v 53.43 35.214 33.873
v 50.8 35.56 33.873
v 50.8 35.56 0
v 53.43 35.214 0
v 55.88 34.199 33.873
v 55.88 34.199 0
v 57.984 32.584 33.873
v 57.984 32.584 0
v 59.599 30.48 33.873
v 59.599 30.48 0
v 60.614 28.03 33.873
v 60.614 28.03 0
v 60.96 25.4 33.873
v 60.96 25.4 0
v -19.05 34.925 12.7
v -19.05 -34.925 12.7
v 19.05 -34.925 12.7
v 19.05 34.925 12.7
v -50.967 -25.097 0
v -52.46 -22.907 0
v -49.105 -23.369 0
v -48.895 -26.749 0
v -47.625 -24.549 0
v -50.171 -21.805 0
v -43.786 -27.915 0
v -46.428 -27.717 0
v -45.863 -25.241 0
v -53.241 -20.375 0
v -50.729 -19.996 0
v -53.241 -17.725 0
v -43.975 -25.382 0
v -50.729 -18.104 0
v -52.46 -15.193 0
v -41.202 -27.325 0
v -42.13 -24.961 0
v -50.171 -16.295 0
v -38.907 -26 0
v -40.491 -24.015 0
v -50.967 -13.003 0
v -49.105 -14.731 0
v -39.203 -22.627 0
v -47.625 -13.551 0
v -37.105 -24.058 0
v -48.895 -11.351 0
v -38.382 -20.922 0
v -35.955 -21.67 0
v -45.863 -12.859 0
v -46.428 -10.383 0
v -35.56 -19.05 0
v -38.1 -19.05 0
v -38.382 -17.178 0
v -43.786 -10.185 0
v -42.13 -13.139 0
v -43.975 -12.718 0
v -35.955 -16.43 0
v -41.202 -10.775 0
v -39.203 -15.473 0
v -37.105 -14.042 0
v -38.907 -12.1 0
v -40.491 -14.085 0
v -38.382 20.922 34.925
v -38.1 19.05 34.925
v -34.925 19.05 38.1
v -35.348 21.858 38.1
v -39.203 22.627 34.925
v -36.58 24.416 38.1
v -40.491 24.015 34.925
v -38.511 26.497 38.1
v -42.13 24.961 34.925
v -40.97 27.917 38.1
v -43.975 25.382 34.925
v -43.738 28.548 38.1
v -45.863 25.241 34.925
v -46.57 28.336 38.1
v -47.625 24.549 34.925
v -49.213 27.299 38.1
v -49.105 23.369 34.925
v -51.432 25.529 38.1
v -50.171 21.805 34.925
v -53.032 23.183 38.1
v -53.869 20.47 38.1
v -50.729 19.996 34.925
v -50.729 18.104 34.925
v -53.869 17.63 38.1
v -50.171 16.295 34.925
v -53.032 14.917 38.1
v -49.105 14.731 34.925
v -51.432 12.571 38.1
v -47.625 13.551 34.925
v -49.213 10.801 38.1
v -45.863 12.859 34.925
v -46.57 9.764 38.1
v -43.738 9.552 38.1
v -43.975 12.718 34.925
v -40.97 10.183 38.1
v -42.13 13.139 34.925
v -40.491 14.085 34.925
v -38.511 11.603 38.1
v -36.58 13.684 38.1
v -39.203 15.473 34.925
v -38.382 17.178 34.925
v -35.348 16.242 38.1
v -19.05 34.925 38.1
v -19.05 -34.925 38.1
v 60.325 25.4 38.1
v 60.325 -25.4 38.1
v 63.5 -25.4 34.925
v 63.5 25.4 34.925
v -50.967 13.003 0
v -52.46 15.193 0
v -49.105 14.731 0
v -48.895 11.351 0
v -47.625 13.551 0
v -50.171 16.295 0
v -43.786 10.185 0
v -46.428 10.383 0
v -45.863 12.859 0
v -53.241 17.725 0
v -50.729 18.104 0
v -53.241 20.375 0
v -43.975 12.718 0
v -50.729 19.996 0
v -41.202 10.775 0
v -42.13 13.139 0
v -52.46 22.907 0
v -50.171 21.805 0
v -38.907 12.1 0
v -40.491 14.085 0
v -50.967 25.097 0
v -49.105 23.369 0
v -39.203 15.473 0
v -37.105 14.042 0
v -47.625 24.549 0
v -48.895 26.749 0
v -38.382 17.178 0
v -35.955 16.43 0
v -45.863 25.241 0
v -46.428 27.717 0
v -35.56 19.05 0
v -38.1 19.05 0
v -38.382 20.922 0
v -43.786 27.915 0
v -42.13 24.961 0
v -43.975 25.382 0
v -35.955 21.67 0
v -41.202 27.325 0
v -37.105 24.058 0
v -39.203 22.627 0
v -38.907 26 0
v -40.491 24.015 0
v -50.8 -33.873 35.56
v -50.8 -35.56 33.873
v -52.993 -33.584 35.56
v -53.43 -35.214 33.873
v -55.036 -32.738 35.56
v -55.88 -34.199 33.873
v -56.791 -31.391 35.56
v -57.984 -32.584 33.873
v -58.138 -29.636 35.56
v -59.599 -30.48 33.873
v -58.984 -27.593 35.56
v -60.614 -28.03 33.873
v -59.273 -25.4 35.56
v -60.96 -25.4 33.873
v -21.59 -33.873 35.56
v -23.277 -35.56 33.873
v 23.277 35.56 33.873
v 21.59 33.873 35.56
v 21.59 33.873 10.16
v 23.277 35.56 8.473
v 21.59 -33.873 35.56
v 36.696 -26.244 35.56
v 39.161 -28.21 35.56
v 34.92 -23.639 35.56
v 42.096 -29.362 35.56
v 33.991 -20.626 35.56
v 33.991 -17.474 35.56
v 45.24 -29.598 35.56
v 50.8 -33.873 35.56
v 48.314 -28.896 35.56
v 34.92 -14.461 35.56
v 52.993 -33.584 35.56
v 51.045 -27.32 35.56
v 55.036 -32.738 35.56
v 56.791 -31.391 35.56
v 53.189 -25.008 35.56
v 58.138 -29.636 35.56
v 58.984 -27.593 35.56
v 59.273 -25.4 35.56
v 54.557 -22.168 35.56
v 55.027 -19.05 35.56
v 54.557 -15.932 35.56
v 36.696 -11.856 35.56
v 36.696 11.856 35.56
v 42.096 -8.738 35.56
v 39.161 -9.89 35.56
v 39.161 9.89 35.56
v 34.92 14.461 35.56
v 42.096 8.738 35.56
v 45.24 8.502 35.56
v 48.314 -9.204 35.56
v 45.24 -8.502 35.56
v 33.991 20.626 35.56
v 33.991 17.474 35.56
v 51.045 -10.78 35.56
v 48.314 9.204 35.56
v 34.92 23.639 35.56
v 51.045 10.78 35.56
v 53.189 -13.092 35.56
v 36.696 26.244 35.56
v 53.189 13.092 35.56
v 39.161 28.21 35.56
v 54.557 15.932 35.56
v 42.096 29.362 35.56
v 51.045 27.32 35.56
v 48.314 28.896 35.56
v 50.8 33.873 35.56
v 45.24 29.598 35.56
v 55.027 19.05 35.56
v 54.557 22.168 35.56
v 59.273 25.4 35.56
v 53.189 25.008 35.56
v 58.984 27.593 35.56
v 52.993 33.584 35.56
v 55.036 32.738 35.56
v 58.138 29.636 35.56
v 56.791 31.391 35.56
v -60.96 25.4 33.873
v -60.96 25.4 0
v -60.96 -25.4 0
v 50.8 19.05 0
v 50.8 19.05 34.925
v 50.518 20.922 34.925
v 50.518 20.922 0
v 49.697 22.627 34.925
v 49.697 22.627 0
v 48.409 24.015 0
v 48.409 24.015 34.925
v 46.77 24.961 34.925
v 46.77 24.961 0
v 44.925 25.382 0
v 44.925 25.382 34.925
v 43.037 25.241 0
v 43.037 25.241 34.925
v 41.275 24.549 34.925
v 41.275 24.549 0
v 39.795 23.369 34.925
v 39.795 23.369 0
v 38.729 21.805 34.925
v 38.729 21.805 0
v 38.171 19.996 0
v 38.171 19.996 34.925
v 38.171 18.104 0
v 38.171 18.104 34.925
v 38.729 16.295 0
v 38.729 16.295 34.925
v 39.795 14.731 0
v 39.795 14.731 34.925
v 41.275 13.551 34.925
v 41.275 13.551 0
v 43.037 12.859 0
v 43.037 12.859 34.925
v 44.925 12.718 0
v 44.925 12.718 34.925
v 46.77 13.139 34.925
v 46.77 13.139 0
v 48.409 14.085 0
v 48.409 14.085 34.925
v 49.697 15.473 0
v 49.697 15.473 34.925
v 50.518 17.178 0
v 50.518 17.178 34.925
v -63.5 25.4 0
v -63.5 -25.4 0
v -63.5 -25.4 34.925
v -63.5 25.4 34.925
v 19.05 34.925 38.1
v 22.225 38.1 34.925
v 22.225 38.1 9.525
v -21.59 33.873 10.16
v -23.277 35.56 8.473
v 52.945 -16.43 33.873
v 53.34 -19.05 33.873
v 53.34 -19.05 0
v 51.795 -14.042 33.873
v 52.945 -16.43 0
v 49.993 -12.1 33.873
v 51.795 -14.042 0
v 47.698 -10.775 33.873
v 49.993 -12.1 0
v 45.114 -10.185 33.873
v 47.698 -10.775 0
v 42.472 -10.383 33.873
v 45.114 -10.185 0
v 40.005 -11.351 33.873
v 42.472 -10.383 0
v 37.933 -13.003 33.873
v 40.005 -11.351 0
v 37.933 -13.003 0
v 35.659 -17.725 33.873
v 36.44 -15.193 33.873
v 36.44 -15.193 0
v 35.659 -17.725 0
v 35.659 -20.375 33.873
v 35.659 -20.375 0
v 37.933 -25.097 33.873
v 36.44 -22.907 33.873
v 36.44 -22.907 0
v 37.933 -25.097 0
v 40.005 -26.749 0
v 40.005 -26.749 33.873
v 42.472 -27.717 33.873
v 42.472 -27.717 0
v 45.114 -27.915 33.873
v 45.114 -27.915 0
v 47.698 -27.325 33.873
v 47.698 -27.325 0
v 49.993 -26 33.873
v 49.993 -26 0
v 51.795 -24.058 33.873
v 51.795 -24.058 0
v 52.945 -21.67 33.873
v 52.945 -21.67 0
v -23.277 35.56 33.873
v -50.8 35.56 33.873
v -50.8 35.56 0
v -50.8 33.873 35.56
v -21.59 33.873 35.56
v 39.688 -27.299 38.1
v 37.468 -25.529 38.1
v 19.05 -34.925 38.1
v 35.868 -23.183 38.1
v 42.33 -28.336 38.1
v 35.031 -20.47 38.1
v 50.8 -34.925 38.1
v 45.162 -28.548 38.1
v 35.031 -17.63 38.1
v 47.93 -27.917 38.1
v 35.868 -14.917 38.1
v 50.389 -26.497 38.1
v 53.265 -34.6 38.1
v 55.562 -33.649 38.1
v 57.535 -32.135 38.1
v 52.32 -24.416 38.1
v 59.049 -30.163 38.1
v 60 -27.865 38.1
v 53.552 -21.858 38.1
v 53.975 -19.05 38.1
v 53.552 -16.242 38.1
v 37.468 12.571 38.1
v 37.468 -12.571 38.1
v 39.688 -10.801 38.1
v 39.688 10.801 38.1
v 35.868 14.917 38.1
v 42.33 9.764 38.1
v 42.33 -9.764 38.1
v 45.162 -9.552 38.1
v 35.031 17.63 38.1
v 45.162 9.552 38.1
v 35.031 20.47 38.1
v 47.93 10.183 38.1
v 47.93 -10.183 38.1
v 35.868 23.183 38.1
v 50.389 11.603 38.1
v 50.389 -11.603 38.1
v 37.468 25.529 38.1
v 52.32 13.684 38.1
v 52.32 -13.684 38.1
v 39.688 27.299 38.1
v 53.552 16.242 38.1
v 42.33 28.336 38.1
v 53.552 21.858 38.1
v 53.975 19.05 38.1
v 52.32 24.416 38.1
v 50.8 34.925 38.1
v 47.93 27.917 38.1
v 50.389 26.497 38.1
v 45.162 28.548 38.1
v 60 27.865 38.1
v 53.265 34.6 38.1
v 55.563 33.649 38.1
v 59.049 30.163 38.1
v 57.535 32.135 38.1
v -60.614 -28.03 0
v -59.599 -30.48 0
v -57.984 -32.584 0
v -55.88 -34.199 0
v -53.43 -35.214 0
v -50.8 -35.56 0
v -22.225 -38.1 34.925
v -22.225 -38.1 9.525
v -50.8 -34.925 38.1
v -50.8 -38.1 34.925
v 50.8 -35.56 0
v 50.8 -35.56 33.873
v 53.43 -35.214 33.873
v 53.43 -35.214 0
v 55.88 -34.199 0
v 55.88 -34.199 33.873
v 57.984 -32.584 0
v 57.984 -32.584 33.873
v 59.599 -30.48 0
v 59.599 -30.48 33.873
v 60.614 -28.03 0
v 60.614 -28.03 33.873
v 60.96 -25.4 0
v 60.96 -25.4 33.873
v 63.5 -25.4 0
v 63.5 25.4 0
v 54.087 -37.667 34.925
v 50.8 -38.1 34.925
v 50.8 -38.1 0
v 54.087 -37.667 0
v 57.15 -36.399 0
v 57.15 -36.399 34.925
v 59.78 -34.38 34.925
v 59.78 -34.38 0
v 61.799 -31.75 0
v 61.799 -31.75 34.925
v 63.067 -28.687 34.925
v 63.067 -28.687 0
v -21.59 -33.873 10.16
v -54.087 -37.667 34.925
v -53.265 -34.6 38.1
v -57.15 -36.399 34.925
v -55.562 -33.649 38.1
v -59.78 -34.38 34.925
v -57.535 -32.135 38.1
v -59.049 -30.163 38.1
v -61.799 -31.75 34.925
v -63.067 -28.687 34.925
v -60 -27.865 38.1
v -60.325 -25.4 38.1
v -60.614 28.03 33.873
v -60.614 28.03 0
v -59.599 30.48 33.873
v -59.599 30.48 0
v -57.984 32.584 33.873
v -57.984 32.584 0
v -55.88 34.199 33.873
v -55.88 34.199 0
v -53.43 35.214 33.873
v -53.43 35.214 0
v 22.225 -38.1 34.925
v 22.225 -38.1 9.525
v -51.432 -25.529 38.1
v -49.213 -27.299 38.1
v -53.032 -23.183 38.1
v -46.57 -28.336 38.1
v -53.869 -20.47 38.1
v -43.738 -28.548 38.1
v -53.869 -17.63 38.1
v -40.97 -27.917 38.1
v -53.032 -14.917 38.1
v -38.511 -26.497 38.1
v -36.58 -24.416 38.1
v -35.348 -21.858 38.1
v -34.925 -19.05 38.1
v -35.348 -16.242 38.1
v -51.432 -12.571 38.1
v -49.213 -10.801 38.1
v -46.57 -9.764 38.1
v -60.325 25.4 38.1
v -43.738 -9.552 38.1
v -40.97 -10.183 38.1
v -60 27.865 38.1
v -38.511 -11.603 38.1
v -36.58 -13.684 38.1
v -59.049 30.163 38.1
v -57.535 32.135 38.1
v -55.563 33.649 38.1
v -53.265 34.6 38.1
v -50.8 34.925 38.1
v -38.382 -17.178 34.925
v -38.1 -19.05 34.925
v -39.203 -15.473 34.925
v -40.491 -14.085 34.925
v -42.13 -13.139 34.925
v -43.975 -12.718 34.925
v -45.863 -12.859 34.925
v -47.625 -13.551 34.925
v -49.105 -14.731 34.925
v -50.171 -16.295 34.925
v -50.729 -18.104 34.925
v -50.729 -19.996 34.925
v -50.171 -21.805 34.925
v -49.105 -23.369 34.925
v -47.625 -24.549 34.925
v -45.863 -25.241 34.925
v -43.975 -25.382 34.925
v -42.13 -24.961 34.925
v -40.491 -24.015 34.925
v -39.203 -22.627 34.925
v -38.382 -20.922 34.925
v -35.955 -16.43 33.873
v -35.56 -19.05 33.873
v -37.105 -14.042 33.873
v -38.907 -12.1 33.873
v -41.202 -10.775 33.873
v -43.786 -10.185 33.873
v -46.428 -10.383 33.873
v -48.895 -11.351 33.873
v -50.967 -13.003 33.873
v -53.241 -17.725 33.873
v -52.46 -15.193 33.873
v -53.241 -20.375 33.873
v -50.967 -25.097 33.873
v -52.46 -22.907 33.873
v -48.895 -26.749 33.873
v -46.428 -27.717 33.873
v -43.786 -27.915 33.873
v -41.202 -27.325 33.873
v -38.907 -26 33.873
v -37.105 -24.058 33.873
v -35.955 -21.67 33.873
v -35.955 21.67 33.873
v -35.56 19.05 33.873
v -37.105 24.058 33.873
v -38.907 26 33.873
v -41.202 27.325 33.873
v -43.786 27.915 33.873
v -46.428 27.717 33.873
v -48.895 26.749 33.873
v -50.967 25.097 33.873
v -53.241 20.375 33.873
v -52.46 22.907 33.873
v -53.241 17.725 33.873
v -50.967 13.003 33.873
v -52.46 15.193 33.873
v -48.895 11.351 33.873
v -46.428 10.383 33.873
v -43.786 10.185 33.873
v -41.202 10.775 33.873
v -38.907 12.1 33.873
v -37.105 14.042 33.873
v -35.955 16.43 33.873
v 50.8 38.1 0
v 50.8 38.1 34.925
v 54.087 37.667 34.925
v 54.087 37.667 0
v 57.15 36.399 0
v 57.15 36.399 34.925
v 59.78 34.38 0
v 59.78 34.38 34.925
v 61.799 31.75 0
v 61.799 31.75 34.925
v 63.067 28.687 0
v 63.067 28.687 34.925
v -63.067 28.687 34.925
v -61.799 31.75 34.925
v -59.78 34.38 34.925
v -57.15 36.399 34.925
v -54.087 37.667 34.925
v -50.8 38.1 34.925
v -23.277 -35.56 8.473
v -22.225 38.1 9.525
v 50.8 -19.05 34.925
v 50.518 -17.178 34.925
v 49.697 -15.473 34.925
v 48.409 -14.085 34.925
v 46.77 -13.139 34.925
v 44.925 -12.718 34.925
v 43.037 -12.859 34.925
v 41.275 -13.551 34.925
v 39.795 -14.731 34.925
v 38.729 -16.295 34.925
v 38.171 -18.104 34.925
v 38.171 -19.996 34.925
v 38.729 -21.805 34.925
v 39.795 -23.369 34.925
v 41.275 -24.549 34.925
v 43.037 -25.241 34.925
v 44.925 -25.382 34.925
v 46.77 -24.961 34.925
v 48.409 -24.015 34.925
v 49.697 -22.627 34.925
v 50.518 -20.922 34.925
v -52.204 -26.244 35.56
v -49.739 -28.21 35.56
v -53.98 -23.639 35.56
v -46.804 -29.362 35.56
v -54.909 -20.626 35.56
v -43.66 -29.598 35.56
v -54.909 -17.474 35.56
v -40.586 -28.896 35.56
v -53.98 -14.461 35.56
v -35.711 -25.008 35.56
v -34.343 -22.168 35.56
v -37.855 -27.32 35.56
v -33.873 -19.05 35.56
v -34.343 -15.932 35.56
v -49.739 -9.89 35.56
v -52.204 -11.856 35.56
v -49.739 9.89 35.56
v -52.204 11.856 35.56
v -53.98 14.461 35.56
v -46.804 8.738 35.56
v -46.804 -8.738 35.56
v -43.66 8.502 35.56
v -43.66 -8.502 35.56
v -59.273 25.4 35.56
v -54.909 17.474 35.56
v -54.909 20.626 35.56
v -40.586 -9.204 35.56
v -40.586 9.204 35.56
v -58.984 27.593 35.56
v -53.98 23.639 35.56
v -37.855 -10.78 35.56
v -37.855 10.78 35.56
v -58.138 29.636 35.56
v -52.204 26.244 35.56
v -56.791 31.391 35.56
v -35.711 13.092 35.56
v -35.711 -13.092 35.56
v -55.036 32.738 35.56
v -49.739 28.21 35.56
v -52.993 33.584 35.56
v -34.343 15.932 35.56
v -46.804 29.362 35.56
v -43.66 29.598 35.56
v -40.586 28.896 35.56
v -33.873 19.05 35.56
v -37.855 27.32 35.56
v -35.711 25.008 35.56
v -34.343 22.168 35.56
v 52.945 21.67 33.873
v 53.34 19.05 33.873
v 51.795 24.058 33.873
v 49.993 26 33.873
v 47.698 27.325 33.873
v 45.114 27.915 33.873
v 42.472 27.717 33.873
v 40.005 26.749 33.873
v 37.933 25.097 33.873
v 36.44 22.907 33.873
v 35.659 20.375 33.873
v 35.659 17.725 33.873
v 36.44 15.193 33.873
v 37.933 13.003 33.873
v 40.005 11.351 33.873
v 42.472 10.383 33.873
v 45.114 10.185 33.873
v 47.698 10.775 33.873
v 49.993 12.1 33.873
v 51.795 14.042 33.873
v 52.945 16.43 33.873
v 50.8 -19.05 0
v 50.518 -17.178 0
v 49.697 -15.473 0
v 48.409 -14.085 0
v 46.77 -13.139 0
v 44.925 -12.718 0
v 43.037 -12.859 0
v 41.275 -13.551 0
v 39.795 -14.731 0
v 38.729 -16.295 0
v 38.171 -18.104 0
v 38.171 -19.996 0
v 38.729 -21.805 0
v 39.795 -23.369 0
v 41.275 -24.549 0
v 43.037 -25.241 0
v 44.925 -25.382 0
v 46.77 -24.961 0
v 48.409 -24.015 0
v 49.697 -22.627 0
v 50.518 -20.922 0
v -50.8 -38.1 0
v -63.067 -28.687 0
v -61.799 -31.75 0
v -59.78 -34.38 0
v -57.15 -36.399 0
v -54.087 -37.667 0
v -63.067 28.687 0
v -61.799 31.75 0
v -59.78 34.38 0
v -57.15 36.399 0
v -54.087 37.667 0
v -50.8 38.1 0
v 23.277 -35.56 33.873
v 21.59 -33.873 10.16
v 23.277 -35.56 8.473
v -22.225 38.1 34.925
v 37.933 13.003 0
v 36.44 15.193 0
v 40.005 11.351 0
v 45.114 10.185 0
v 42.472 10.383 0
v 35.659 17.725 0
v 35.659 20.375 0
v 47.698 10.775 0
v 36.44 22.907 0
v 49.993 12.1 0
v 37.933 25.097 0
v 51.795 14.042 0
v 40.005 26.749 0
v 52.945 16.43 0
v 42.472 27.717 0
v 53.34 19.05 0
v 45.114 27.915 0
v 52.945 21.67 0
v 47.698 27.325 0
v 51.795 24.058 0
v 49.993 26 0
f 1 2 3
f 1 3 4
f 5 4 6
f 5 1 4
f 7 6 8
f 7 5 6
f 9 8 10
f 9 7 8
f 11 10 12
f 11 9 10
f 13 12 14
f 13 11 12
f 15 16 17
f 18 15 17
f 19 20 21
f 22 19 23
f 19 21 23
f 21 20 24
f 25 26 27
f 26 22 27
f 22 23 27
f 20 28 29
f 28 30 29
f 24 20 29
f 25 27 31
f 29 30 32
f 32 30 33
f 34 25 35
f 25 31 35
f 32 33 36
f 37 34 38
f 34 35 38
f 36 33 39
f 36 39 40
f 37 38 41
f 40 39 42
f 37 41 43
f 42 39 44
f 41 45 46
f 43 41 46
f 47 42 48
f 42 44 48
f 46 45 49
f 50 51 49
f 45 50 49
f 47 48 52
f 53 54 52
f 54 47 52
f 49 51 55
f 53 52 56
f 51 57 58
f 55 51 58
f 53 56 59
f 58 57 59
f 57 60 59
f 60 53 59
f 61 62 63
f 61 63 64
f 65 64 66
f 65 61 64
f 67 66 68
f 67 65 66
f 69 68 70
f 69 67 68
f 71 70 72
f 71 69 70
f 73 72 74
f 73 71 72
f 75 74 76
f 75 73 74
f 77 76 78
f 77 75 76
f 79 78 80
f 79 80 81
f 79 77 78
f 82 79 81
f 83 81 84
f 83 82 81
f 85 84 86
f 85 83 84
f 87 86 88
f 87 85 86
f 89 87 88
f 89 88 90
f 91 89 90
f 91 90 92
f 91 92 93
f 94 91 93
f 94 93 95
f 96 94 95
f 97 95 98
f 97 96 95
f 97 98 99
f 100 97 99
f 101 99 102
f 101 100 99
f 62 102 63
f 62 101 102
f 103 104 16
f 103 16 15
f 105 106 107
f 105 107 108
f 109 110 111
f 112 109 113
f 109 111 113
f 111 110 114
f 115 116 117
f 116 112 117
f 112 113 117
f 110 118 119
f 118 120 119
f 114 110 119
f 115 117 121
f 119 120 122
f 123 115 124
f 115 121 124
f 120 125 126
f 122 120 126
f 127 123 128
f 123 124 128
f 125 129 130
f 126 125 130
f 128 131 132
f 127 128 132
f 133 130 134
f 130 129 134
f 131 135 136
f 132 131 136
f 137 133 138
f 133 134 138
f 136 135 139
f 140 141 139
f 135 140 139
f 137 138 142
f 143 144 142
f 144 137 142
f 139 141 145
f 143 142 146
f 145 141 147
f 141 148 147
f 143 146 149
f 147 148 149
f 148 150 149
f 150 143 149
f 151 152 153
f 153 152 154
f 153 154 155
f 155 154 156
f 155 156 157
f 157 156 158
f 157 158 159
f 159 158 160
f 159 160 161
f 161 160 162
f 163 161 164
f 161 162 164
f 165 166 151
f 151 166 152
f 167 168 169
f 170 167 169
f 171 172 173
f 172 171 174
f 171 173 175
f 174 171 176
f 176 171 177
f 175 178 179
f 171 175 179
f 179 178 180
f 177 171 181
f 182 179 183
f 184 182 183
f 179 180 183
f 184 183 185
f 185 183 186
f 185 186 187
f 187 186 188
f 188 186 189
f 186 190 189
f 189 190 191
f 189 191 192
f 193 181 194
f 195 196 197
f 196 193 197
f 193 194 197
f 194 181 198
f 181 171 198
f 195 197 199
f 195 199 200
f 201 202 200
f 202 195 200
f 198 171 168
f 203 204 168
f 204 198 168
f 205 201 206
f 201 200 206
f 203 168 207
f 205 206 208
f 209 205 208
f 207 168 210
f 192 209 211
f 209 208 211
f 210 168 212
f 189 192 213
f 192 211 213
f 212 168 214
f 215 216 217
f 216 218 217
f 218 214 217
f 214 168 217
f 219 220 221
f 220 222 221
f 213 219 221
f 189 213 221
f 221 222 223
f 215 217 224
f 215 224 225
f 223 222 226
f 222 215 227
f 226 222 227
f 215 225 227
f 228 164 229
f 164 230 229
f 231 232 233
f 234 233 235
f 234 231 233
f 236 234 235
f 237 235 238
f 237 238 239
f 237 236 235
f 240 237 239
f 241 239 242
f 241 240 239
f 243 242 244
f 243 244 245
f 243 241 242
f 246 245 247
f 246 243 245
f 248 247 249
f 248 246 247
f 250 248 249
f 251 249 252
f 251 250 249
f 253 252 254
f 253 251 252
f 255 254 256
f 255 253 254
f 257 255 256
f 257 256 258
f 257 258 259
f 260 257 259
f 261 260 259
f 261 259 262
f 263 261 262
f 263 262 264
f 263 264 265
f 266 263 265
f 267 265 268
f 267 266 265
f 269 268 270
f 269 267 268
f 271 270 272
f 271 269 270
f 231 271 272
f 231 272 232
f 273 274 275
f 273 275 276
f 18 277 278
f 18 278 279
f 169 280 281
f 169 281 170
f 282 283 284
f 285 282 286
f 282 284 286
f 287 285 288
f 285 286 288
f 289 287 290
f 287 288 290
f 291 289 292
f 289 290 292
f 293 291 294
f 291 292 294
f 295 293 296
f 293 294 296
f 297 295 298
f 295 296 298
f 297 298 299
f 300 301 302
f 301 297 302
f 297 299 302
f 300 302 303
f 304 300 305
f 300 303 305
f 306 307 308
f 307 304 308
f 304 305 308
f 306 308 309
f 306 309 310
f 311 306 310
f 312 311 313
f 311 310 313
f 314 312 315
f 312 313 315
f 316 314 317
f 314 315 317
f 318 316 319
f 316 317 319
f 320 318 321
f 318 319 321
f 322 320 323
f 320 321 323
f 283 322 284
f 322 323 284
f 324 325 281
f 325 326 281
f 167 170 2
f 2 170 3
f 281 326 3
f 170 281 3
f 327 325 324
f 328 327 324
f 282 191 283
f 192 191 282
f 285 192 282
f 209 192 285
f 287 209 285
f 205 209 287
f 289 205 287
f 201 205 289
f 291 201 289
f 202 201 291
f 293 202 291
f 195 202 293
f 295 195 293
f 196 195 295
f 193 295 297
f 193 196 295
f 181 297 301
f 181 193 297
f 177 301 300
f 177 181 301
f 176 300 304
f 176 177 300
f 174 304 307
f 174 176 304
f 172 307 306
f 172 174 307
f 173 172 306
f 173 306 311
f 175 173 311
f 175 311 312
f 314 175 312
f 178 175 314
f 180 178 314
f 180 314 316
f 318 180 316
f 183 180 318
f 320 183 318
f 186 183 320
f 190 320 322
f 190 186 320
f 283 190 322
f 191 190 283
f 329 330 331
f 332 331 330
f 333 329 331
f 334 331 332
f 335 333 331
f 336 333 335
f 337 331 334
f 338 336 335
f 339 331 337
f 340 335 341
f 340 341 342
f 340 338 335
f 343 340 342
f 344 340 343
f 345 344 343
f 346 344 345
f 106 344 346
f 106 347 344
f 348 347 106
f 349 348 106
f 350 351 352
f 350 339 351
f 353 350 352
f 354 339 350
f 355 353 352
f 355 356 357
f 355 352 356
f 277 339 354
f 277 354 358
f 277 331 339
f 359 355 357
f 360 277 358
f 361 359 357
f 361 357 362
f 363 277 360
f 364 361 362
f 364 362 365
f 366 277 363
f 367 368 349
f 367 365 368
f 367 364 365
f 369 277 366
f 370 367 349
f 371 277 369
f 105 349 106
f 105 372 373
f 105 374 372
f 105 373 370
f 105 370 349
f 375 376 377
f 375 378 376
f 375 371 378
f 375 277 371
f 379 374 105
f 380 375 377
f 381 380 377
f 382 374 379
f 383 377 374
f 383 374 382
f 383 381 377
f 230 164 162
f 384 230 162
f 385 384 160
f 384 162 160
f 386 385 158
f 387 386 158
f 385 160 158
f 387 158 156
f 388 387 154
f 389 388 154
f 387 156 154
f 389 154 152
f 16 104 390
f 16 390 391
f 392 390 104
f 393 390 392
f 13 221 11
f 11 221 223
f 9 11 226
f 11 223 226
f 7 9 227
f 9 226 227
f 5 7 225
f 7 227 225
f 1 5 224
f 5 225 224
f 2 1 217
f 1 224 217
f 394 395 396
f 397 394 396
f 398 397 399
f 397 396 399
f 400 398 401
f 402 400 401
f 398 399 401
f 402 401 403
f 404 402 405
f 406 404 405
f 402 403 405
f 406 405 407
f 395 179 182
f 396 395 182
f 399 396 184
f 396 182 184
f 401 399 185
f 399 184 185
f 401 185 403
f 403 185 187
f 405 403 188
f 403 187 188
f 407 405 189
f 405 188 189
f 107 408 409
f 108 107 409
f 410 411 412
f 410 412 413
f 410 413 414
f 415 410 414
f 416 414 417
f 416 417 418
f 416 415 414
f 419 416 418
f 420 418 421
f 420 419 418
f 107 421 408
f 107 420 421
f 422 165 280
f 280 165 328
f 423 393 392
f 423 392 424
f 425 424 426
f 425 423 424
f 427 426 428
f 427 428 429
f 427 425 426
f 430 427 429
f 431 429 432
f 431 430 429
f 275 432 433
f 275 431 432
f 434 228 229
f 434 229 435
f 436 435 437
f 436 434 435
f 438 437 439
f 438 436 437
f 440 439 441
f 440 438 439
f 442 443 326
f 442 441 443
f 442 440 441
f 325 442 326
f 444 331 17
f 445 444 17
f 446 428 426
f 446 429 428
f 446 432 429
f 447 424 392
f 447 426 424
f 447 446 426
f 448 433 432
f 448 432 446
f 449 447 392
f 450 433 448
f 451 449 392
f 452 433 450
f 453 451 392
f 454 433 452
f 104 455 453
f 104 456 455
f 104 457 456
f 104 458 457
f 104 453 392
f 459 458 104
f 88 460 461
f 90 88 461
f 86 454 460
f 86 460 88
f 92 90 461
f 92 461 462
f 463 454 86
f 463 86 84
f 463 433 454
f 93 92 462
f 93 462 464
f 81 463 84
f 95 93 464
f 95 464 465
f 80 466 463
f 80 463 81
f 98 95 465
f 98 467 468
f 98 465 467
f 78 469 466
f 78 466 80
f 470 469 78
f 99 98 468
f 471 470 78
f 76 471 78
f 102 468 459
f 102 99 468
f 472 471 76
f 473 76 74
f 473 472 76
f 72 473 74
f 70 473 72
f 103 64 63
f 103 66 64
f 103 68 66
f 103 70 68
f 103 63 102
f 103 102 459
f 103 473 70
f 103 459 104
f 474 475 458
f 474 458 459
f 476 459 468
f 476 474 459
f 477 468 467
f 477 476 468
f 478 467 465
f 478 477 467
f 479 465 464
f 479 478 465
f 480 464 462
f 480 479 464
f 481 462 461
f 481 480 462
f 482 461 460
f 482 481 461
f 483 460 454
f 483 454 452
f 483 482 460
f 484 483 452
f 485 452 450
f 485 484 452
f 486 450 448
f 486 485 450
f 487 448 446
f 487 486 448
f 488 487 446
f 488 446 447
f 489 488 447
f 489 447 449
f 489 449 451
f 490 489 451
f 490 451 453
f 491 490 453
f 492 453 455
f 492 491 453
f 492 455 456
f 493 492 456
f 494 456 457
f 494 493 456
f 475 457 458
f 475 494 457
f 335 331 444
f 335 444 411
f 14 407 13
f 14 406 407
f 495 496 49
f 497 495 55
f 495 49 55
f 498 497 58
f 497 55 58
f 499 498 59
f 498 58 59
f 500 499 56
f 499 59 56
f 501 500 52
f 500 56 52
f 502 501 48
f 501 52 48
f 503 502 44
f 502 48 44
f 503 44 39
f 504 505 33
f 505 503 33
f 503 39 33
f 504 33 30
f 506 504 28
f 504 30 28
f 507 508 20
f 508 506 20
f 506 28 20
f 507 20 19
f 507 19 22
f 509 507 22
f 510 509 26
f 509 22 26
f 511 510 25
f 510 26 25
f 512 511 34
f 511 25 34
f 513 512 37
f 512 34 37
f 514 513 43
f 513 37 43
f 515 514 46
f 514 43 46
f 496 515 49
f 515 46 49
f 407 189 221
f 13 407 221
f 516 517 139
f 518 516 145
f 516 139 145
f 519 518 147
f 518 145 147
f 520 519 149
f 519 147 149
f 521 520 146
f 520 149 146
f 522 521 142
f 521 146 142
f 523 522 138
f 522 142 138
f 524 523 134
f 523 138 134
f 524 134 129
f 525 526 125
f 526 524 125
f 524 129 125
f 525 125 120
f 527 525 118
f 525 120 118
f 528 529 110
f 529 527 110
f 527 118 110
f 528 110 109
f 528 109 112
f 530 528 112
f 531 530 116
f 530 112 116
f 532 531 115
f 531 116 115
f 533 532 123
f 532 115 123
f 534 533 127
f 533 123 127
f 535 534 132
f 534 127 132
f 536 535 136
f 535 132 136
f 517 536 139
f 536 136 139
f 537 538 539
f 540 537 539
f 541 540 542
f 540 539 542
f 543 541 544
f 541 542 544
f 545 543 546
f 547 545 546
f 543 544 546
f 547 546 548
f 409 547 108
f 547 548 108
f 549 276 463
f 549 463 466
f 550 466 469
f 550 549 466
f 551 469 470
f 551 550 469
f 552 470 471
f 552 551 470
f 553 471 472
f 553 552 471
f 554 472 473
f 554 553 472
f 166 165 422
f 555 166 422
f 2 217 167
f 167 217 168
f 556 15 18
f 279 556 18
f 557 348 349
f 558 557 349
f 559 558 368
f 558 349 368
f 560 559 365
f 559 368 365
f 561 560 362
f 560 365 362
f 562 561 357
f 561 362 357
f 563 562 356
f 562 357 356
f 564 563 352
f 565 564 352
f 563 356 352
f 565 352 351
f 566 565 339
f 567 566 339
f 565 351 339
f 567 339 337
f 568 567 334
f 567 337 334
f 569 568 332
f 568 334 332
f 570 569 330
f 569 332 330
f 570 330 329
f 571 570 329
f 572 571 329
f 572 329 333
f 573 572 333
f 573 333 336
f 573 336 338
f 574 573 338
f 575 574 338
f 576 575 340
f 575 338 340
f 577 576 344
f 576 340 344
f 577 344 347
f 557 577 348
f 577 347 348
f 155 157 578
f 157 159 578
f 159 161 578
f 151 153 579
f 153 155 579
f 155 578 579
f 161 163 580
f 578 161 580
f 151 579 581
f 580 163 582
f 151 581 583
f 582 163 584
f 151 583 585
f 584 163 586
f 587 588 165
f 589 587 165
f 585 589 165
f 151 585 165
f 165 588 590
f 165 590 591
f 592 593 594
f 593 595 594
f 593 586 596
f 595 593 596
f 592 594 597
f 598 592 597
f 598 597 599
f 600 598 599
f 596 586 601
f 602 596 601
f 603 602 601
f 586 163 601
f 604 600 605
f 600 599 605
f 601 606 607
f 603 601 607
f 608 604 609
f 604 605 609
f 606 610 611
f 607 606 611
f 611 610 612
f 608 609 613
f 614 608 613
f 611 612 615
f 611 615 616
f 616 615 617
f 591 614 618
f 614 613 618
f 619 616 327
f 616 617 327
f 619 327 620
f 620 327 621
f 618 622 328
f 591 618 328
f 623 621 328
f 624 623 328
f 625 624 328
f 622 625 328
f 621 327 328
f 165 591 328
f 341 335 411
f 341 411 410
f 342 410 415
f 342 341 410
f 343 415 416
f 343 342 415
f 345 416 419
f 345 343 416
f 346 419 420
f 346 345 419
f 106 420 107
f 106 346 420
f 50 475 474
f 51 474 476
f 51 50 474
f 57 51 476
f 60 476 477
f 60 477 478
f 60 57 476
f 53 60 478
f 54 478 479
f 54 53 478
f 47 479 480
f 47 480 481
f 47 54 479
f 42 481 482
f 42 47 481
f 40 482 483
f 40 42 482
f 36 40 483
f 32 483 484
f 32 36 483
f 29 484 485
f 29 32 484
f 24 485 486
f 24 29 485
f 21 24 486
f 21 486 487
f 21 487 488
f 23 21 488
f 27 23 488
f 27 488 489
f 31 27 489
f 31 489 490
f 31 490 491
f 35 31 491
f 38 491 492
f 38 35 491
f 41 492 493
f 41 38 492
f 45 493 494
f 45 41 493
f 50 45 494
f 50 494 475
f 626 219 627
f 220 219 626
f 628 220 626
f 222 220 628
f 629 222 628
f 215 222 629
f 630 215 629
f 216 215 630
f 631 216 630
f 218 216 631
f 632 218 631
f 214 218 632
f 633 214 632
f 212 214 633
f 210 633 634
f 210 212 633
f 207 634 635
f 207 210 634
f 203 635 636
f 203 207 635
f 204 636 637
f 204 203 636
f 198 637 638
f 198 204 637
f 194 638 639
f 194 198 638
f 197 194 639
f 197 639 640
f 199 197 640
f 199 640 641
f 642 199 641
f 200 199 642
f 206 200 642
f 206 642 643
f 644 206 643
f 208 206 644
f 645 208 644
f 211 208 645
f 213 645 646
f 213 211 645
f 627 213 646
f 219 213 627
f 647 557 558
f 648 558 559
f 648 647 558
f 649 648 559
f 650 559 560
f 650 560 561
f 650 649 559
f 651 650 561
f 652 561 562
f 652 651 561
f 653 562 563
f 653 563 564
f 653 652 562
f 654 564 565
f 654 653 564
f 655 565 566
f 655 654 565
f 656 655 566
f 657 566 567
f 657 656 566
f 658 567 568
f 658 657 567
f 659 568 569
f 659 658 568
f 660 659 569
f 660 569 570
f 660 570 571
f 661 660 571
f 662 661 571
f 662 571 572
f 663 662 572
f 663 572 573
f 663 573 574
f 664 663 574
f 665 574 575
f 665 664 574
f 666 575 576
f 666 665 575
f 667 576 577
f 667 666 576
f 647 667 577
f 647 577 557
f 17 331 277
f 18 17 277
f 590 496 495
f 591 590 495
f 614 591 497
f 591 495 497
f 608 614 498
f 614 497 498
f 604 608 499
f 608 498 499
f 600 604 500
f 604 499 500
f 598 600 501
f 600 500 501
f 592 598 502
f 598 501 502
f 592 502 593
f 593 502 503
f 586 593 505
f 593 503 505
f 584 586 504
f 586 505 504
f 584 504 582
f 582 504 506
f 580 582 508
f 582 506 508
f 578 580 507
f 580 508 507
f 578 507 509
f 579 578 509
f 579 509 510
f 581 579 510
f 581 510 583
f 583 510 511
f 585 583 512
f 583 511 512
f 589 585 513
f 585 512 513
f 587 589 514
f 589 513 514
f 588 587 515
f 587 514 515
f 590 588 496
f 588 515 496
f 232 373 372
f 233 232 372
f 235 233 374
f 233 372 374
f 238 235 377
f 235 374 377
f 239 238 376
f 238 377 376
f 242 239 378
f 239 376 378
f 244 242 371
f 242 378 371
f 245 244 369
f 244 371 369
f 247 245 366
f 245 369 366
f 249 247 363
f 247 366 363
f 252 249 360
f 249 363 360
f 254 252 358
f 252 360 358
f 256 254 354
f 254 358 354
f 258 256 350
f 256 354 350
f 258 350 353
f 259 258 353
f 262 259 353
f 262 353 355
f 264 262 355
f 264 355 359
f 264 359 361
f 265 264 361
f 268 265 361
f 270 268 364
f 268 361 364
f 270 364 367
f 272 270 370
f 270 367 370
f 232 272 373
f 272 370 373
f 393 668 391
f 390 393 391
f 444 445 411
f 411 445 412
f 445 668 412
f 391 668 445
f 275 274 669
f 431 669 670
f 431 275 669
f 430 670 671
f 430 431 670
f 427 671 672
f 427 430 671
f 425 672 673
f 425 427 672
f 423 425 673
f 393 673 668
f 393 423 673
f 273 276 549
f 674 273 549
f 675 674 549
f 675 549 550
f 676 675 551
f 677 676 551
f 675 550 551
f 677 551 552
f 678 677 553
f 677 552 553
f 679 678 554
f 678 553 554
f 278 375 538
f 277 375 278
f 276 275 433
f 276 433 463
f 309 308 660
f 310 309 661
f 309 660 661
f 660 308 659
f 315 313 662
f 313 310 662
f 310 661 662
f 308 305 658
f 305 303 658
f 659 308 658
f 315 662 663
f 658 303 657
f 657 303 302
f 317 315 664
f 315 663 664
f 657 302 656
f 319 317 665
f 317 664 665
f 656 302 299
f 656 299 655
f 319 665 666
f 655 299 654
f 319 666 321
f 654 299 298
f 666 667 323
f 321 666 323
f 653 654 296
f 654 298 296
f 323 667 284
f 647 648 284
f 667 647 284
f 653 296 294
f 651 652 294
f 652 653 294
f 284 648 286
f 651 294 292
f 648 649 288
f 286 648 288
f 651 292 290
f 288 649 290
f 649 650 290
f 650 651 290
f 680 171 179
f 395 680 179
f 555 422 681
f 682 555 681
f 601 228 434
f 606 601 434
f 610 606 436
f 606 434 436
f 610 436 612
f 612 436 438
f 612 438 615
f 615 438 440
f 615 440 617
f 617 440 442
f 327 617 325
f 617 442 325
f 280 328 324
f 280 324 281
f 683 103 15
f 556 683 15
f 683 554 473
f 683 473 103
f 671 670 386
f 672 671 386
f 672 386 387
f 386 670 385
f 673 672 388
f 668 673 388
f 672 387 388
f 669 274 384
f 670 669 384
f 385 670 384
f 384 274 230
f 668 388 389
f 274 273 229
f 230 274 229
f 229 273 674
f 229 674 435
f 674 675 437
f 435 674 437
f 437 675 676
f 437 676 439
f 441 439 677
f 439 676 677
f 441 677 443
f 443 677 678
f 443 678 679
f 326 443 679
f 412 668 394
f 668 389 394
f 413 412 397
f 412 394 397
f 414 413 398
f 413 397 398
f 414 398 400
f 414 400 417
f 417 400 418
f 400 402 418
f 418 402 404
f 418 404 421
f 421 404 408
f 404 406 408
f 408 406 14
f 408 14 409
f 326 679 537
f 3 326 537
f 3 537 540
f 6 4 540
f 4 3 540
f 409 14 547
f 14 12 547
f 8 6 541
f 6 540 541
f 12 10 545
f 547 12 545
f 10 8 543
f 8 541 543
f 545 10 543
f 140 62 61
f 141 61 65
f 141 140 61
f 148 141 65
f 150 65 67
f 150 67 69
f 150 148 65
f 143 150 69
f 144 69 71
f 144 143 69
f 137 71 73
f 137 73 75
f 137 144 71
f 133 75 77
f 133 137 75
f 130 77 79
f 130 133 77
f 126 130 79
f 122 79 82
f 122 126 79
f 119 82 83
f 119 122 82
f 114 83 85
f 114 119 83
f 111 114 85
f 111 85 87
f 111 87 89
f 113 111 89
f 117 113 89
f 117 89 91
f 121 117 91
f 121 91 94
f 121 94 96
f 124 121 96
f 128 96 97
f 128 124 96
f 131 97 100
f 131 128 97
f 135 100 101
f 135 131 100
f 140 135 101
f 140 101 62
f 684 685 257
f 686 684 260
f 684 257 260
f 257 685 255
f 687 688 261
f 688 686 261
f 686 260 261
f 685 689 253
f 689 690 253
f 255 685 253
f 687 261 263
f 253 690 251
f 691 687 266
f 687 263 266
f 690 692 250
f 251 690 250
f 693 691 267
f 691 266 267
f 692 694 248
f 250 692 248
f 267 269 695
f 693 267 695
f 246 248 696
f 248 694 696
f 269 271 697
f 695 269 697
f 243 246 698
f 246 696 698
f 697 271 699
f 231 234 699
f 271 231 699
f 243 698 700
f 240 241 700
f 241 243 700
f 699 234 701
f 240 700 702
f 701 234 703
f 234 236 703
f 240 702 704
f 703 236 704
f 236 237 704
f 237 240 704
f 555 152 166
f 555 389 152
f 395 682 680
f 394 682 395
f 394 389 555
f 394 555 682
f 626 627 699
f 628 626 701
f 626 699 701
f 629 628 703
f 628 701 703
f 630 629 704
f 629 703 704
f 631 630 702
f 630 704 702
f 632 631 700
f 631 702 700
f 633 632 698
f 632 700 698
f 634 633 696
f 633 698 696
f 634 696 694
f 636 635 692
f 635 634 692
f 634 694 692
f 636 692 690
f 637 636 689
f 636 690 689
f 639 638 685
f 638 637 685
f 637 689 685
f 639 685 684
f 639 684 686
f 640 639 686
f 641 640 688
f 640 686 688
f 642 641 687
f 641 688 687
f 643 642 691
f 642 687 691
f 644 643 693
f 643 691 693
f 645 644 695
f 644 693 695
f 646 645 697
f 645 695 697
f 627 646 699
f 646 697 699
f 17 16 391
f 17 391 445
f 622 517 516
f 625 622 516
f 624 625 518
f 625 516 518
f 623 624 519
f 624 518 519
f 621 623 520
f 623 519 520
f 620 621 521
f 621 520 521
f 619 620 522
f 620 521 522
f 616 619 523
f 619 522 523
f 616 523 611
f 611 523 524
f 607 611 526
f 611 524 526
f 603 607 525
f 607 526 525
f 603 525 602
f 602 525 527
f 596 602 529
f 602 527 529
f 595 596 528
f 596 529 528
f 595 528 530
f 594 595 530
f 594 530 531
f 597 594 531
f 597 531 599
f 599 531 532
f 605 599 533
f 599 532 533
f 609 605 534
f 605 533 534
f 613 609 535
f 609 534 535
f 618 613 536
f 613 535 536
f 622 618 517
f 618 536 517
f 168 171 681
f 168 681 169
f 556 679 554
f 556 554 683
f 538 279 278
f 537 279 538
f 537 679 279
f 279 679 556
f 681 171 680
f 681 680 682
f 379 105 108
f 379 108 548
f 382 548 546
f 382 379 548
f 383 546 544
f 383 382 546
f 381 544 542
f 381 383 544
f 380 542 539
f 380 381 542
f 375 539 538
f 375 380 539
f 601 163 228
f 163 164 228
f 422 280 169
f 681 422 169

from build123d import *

# Parameters (mm, degrees)
SKETCH1_W           = 127
SKETCH1_H           = 76.2
SKETCH1_R           = 6.35
BOSS_EXTRUDE1_DEPTH = 38.1
SKETCH3_W           = 38.1
SKETCH3_H           = 76.2
CUT_EXTRUDE1_DEPTH  = 25.4
FILLET1_R           = 12.7
CHAMFER1_SIZE       = 3.175
SHELL1_T            = -2.54


with BuildPart() as part:
    # Sketch1 → Boss-Extrude1 (new body)
    with BuildSketch(Plane.XY):
        Rectangle(SKETCH1_W, SKETCH1_H)
        with Locations((-44.45, 19.05)):
            Circle(SKETCH1_R, mode=Mode.SUBTRACT)
        with Locations((44.45, 19.05)):
            Circle(SKETCH1_R, mode=Mode.SUBTRACT)
        with Locations((-44.45, -19.05)):
            Circle(SKETCH1_R, mode=Mode.SUBTRACT)
        with Locations((44.45, -19.05)):
            Circle(SKETCH1_R, mode=Mode.SUBTRACT)
    extrude(amount=BOSS_EXTRUDE1_DEPTH)

    # Sketch3 → Cut-Extrude1 (cut)
    with BuildSketch(Plane.XY.offset(38.1)):
        Rectangle(SKETCH3_W, SKETCH3_H)
    extrude(amount=-CUT_EXTRUDE1_DEPTH, mode=Mode.SUBTRACT)

    # Fillet1
    fillet1_edges = [part.edges().sort_by_distance(p)[0] for p in [
        (63.5, -38.1, 19.05),
        (-63.5, -38.1, 19.05),
        (-63.5, 38.1, 19.05),
        (63.5, 38.1, 19.05),
    ]]
    fillet(fillet1_edges, radius=FILLET1_R)

    # Chamfer1
    chamfer1_edges = [part.edges().sort_by_distance(p)[0] for p in [
        (-50.8, 19.05, 38.1),
        (38.1, 19.05, 38.1),
        (-50.8, -19.05, 38.1),
        (38.1, -19.05, 38.1),
        (34.925, -38.1, 38.1),
        (-34.925, 38.1, 38.1),
        (19.05, 38.1, 25.4),
        (0, -38.1, 12.7),
        (19.05, -38.1, 25.4),
        (-19.05, -38.1, 25.4),
        (0, 38.1, 12.7),
        (-19.05, 38.1, 25.4),
        (-34.925, -38.1, 38.1),
        (-63.5, 0, 38.1),
        (-59.780256121, 34.380256121, 38.1),
        (-59.780256121, -34.380256121, 38.1),
        (63.5, 0, 38.1),
        (34.925, 38.1, 38.1),
        (59.780256121, 34.380256121, 38.1),
        (59.780256121, -34.380256121, 38.1),
    ]]
    chamfer(chamfer1_edges, length=CHAMFER1_SIZE)

    # Shell1
    shell1_openings = [part.faces().sort_by_distance(p)[0] for p in [
        (-50.8, -19.05, 0),
    ]]
    offset(amount=SHELL1_T, openings=shell1_openings, kind=Kind.INTERSECTION)


solid = part.part
